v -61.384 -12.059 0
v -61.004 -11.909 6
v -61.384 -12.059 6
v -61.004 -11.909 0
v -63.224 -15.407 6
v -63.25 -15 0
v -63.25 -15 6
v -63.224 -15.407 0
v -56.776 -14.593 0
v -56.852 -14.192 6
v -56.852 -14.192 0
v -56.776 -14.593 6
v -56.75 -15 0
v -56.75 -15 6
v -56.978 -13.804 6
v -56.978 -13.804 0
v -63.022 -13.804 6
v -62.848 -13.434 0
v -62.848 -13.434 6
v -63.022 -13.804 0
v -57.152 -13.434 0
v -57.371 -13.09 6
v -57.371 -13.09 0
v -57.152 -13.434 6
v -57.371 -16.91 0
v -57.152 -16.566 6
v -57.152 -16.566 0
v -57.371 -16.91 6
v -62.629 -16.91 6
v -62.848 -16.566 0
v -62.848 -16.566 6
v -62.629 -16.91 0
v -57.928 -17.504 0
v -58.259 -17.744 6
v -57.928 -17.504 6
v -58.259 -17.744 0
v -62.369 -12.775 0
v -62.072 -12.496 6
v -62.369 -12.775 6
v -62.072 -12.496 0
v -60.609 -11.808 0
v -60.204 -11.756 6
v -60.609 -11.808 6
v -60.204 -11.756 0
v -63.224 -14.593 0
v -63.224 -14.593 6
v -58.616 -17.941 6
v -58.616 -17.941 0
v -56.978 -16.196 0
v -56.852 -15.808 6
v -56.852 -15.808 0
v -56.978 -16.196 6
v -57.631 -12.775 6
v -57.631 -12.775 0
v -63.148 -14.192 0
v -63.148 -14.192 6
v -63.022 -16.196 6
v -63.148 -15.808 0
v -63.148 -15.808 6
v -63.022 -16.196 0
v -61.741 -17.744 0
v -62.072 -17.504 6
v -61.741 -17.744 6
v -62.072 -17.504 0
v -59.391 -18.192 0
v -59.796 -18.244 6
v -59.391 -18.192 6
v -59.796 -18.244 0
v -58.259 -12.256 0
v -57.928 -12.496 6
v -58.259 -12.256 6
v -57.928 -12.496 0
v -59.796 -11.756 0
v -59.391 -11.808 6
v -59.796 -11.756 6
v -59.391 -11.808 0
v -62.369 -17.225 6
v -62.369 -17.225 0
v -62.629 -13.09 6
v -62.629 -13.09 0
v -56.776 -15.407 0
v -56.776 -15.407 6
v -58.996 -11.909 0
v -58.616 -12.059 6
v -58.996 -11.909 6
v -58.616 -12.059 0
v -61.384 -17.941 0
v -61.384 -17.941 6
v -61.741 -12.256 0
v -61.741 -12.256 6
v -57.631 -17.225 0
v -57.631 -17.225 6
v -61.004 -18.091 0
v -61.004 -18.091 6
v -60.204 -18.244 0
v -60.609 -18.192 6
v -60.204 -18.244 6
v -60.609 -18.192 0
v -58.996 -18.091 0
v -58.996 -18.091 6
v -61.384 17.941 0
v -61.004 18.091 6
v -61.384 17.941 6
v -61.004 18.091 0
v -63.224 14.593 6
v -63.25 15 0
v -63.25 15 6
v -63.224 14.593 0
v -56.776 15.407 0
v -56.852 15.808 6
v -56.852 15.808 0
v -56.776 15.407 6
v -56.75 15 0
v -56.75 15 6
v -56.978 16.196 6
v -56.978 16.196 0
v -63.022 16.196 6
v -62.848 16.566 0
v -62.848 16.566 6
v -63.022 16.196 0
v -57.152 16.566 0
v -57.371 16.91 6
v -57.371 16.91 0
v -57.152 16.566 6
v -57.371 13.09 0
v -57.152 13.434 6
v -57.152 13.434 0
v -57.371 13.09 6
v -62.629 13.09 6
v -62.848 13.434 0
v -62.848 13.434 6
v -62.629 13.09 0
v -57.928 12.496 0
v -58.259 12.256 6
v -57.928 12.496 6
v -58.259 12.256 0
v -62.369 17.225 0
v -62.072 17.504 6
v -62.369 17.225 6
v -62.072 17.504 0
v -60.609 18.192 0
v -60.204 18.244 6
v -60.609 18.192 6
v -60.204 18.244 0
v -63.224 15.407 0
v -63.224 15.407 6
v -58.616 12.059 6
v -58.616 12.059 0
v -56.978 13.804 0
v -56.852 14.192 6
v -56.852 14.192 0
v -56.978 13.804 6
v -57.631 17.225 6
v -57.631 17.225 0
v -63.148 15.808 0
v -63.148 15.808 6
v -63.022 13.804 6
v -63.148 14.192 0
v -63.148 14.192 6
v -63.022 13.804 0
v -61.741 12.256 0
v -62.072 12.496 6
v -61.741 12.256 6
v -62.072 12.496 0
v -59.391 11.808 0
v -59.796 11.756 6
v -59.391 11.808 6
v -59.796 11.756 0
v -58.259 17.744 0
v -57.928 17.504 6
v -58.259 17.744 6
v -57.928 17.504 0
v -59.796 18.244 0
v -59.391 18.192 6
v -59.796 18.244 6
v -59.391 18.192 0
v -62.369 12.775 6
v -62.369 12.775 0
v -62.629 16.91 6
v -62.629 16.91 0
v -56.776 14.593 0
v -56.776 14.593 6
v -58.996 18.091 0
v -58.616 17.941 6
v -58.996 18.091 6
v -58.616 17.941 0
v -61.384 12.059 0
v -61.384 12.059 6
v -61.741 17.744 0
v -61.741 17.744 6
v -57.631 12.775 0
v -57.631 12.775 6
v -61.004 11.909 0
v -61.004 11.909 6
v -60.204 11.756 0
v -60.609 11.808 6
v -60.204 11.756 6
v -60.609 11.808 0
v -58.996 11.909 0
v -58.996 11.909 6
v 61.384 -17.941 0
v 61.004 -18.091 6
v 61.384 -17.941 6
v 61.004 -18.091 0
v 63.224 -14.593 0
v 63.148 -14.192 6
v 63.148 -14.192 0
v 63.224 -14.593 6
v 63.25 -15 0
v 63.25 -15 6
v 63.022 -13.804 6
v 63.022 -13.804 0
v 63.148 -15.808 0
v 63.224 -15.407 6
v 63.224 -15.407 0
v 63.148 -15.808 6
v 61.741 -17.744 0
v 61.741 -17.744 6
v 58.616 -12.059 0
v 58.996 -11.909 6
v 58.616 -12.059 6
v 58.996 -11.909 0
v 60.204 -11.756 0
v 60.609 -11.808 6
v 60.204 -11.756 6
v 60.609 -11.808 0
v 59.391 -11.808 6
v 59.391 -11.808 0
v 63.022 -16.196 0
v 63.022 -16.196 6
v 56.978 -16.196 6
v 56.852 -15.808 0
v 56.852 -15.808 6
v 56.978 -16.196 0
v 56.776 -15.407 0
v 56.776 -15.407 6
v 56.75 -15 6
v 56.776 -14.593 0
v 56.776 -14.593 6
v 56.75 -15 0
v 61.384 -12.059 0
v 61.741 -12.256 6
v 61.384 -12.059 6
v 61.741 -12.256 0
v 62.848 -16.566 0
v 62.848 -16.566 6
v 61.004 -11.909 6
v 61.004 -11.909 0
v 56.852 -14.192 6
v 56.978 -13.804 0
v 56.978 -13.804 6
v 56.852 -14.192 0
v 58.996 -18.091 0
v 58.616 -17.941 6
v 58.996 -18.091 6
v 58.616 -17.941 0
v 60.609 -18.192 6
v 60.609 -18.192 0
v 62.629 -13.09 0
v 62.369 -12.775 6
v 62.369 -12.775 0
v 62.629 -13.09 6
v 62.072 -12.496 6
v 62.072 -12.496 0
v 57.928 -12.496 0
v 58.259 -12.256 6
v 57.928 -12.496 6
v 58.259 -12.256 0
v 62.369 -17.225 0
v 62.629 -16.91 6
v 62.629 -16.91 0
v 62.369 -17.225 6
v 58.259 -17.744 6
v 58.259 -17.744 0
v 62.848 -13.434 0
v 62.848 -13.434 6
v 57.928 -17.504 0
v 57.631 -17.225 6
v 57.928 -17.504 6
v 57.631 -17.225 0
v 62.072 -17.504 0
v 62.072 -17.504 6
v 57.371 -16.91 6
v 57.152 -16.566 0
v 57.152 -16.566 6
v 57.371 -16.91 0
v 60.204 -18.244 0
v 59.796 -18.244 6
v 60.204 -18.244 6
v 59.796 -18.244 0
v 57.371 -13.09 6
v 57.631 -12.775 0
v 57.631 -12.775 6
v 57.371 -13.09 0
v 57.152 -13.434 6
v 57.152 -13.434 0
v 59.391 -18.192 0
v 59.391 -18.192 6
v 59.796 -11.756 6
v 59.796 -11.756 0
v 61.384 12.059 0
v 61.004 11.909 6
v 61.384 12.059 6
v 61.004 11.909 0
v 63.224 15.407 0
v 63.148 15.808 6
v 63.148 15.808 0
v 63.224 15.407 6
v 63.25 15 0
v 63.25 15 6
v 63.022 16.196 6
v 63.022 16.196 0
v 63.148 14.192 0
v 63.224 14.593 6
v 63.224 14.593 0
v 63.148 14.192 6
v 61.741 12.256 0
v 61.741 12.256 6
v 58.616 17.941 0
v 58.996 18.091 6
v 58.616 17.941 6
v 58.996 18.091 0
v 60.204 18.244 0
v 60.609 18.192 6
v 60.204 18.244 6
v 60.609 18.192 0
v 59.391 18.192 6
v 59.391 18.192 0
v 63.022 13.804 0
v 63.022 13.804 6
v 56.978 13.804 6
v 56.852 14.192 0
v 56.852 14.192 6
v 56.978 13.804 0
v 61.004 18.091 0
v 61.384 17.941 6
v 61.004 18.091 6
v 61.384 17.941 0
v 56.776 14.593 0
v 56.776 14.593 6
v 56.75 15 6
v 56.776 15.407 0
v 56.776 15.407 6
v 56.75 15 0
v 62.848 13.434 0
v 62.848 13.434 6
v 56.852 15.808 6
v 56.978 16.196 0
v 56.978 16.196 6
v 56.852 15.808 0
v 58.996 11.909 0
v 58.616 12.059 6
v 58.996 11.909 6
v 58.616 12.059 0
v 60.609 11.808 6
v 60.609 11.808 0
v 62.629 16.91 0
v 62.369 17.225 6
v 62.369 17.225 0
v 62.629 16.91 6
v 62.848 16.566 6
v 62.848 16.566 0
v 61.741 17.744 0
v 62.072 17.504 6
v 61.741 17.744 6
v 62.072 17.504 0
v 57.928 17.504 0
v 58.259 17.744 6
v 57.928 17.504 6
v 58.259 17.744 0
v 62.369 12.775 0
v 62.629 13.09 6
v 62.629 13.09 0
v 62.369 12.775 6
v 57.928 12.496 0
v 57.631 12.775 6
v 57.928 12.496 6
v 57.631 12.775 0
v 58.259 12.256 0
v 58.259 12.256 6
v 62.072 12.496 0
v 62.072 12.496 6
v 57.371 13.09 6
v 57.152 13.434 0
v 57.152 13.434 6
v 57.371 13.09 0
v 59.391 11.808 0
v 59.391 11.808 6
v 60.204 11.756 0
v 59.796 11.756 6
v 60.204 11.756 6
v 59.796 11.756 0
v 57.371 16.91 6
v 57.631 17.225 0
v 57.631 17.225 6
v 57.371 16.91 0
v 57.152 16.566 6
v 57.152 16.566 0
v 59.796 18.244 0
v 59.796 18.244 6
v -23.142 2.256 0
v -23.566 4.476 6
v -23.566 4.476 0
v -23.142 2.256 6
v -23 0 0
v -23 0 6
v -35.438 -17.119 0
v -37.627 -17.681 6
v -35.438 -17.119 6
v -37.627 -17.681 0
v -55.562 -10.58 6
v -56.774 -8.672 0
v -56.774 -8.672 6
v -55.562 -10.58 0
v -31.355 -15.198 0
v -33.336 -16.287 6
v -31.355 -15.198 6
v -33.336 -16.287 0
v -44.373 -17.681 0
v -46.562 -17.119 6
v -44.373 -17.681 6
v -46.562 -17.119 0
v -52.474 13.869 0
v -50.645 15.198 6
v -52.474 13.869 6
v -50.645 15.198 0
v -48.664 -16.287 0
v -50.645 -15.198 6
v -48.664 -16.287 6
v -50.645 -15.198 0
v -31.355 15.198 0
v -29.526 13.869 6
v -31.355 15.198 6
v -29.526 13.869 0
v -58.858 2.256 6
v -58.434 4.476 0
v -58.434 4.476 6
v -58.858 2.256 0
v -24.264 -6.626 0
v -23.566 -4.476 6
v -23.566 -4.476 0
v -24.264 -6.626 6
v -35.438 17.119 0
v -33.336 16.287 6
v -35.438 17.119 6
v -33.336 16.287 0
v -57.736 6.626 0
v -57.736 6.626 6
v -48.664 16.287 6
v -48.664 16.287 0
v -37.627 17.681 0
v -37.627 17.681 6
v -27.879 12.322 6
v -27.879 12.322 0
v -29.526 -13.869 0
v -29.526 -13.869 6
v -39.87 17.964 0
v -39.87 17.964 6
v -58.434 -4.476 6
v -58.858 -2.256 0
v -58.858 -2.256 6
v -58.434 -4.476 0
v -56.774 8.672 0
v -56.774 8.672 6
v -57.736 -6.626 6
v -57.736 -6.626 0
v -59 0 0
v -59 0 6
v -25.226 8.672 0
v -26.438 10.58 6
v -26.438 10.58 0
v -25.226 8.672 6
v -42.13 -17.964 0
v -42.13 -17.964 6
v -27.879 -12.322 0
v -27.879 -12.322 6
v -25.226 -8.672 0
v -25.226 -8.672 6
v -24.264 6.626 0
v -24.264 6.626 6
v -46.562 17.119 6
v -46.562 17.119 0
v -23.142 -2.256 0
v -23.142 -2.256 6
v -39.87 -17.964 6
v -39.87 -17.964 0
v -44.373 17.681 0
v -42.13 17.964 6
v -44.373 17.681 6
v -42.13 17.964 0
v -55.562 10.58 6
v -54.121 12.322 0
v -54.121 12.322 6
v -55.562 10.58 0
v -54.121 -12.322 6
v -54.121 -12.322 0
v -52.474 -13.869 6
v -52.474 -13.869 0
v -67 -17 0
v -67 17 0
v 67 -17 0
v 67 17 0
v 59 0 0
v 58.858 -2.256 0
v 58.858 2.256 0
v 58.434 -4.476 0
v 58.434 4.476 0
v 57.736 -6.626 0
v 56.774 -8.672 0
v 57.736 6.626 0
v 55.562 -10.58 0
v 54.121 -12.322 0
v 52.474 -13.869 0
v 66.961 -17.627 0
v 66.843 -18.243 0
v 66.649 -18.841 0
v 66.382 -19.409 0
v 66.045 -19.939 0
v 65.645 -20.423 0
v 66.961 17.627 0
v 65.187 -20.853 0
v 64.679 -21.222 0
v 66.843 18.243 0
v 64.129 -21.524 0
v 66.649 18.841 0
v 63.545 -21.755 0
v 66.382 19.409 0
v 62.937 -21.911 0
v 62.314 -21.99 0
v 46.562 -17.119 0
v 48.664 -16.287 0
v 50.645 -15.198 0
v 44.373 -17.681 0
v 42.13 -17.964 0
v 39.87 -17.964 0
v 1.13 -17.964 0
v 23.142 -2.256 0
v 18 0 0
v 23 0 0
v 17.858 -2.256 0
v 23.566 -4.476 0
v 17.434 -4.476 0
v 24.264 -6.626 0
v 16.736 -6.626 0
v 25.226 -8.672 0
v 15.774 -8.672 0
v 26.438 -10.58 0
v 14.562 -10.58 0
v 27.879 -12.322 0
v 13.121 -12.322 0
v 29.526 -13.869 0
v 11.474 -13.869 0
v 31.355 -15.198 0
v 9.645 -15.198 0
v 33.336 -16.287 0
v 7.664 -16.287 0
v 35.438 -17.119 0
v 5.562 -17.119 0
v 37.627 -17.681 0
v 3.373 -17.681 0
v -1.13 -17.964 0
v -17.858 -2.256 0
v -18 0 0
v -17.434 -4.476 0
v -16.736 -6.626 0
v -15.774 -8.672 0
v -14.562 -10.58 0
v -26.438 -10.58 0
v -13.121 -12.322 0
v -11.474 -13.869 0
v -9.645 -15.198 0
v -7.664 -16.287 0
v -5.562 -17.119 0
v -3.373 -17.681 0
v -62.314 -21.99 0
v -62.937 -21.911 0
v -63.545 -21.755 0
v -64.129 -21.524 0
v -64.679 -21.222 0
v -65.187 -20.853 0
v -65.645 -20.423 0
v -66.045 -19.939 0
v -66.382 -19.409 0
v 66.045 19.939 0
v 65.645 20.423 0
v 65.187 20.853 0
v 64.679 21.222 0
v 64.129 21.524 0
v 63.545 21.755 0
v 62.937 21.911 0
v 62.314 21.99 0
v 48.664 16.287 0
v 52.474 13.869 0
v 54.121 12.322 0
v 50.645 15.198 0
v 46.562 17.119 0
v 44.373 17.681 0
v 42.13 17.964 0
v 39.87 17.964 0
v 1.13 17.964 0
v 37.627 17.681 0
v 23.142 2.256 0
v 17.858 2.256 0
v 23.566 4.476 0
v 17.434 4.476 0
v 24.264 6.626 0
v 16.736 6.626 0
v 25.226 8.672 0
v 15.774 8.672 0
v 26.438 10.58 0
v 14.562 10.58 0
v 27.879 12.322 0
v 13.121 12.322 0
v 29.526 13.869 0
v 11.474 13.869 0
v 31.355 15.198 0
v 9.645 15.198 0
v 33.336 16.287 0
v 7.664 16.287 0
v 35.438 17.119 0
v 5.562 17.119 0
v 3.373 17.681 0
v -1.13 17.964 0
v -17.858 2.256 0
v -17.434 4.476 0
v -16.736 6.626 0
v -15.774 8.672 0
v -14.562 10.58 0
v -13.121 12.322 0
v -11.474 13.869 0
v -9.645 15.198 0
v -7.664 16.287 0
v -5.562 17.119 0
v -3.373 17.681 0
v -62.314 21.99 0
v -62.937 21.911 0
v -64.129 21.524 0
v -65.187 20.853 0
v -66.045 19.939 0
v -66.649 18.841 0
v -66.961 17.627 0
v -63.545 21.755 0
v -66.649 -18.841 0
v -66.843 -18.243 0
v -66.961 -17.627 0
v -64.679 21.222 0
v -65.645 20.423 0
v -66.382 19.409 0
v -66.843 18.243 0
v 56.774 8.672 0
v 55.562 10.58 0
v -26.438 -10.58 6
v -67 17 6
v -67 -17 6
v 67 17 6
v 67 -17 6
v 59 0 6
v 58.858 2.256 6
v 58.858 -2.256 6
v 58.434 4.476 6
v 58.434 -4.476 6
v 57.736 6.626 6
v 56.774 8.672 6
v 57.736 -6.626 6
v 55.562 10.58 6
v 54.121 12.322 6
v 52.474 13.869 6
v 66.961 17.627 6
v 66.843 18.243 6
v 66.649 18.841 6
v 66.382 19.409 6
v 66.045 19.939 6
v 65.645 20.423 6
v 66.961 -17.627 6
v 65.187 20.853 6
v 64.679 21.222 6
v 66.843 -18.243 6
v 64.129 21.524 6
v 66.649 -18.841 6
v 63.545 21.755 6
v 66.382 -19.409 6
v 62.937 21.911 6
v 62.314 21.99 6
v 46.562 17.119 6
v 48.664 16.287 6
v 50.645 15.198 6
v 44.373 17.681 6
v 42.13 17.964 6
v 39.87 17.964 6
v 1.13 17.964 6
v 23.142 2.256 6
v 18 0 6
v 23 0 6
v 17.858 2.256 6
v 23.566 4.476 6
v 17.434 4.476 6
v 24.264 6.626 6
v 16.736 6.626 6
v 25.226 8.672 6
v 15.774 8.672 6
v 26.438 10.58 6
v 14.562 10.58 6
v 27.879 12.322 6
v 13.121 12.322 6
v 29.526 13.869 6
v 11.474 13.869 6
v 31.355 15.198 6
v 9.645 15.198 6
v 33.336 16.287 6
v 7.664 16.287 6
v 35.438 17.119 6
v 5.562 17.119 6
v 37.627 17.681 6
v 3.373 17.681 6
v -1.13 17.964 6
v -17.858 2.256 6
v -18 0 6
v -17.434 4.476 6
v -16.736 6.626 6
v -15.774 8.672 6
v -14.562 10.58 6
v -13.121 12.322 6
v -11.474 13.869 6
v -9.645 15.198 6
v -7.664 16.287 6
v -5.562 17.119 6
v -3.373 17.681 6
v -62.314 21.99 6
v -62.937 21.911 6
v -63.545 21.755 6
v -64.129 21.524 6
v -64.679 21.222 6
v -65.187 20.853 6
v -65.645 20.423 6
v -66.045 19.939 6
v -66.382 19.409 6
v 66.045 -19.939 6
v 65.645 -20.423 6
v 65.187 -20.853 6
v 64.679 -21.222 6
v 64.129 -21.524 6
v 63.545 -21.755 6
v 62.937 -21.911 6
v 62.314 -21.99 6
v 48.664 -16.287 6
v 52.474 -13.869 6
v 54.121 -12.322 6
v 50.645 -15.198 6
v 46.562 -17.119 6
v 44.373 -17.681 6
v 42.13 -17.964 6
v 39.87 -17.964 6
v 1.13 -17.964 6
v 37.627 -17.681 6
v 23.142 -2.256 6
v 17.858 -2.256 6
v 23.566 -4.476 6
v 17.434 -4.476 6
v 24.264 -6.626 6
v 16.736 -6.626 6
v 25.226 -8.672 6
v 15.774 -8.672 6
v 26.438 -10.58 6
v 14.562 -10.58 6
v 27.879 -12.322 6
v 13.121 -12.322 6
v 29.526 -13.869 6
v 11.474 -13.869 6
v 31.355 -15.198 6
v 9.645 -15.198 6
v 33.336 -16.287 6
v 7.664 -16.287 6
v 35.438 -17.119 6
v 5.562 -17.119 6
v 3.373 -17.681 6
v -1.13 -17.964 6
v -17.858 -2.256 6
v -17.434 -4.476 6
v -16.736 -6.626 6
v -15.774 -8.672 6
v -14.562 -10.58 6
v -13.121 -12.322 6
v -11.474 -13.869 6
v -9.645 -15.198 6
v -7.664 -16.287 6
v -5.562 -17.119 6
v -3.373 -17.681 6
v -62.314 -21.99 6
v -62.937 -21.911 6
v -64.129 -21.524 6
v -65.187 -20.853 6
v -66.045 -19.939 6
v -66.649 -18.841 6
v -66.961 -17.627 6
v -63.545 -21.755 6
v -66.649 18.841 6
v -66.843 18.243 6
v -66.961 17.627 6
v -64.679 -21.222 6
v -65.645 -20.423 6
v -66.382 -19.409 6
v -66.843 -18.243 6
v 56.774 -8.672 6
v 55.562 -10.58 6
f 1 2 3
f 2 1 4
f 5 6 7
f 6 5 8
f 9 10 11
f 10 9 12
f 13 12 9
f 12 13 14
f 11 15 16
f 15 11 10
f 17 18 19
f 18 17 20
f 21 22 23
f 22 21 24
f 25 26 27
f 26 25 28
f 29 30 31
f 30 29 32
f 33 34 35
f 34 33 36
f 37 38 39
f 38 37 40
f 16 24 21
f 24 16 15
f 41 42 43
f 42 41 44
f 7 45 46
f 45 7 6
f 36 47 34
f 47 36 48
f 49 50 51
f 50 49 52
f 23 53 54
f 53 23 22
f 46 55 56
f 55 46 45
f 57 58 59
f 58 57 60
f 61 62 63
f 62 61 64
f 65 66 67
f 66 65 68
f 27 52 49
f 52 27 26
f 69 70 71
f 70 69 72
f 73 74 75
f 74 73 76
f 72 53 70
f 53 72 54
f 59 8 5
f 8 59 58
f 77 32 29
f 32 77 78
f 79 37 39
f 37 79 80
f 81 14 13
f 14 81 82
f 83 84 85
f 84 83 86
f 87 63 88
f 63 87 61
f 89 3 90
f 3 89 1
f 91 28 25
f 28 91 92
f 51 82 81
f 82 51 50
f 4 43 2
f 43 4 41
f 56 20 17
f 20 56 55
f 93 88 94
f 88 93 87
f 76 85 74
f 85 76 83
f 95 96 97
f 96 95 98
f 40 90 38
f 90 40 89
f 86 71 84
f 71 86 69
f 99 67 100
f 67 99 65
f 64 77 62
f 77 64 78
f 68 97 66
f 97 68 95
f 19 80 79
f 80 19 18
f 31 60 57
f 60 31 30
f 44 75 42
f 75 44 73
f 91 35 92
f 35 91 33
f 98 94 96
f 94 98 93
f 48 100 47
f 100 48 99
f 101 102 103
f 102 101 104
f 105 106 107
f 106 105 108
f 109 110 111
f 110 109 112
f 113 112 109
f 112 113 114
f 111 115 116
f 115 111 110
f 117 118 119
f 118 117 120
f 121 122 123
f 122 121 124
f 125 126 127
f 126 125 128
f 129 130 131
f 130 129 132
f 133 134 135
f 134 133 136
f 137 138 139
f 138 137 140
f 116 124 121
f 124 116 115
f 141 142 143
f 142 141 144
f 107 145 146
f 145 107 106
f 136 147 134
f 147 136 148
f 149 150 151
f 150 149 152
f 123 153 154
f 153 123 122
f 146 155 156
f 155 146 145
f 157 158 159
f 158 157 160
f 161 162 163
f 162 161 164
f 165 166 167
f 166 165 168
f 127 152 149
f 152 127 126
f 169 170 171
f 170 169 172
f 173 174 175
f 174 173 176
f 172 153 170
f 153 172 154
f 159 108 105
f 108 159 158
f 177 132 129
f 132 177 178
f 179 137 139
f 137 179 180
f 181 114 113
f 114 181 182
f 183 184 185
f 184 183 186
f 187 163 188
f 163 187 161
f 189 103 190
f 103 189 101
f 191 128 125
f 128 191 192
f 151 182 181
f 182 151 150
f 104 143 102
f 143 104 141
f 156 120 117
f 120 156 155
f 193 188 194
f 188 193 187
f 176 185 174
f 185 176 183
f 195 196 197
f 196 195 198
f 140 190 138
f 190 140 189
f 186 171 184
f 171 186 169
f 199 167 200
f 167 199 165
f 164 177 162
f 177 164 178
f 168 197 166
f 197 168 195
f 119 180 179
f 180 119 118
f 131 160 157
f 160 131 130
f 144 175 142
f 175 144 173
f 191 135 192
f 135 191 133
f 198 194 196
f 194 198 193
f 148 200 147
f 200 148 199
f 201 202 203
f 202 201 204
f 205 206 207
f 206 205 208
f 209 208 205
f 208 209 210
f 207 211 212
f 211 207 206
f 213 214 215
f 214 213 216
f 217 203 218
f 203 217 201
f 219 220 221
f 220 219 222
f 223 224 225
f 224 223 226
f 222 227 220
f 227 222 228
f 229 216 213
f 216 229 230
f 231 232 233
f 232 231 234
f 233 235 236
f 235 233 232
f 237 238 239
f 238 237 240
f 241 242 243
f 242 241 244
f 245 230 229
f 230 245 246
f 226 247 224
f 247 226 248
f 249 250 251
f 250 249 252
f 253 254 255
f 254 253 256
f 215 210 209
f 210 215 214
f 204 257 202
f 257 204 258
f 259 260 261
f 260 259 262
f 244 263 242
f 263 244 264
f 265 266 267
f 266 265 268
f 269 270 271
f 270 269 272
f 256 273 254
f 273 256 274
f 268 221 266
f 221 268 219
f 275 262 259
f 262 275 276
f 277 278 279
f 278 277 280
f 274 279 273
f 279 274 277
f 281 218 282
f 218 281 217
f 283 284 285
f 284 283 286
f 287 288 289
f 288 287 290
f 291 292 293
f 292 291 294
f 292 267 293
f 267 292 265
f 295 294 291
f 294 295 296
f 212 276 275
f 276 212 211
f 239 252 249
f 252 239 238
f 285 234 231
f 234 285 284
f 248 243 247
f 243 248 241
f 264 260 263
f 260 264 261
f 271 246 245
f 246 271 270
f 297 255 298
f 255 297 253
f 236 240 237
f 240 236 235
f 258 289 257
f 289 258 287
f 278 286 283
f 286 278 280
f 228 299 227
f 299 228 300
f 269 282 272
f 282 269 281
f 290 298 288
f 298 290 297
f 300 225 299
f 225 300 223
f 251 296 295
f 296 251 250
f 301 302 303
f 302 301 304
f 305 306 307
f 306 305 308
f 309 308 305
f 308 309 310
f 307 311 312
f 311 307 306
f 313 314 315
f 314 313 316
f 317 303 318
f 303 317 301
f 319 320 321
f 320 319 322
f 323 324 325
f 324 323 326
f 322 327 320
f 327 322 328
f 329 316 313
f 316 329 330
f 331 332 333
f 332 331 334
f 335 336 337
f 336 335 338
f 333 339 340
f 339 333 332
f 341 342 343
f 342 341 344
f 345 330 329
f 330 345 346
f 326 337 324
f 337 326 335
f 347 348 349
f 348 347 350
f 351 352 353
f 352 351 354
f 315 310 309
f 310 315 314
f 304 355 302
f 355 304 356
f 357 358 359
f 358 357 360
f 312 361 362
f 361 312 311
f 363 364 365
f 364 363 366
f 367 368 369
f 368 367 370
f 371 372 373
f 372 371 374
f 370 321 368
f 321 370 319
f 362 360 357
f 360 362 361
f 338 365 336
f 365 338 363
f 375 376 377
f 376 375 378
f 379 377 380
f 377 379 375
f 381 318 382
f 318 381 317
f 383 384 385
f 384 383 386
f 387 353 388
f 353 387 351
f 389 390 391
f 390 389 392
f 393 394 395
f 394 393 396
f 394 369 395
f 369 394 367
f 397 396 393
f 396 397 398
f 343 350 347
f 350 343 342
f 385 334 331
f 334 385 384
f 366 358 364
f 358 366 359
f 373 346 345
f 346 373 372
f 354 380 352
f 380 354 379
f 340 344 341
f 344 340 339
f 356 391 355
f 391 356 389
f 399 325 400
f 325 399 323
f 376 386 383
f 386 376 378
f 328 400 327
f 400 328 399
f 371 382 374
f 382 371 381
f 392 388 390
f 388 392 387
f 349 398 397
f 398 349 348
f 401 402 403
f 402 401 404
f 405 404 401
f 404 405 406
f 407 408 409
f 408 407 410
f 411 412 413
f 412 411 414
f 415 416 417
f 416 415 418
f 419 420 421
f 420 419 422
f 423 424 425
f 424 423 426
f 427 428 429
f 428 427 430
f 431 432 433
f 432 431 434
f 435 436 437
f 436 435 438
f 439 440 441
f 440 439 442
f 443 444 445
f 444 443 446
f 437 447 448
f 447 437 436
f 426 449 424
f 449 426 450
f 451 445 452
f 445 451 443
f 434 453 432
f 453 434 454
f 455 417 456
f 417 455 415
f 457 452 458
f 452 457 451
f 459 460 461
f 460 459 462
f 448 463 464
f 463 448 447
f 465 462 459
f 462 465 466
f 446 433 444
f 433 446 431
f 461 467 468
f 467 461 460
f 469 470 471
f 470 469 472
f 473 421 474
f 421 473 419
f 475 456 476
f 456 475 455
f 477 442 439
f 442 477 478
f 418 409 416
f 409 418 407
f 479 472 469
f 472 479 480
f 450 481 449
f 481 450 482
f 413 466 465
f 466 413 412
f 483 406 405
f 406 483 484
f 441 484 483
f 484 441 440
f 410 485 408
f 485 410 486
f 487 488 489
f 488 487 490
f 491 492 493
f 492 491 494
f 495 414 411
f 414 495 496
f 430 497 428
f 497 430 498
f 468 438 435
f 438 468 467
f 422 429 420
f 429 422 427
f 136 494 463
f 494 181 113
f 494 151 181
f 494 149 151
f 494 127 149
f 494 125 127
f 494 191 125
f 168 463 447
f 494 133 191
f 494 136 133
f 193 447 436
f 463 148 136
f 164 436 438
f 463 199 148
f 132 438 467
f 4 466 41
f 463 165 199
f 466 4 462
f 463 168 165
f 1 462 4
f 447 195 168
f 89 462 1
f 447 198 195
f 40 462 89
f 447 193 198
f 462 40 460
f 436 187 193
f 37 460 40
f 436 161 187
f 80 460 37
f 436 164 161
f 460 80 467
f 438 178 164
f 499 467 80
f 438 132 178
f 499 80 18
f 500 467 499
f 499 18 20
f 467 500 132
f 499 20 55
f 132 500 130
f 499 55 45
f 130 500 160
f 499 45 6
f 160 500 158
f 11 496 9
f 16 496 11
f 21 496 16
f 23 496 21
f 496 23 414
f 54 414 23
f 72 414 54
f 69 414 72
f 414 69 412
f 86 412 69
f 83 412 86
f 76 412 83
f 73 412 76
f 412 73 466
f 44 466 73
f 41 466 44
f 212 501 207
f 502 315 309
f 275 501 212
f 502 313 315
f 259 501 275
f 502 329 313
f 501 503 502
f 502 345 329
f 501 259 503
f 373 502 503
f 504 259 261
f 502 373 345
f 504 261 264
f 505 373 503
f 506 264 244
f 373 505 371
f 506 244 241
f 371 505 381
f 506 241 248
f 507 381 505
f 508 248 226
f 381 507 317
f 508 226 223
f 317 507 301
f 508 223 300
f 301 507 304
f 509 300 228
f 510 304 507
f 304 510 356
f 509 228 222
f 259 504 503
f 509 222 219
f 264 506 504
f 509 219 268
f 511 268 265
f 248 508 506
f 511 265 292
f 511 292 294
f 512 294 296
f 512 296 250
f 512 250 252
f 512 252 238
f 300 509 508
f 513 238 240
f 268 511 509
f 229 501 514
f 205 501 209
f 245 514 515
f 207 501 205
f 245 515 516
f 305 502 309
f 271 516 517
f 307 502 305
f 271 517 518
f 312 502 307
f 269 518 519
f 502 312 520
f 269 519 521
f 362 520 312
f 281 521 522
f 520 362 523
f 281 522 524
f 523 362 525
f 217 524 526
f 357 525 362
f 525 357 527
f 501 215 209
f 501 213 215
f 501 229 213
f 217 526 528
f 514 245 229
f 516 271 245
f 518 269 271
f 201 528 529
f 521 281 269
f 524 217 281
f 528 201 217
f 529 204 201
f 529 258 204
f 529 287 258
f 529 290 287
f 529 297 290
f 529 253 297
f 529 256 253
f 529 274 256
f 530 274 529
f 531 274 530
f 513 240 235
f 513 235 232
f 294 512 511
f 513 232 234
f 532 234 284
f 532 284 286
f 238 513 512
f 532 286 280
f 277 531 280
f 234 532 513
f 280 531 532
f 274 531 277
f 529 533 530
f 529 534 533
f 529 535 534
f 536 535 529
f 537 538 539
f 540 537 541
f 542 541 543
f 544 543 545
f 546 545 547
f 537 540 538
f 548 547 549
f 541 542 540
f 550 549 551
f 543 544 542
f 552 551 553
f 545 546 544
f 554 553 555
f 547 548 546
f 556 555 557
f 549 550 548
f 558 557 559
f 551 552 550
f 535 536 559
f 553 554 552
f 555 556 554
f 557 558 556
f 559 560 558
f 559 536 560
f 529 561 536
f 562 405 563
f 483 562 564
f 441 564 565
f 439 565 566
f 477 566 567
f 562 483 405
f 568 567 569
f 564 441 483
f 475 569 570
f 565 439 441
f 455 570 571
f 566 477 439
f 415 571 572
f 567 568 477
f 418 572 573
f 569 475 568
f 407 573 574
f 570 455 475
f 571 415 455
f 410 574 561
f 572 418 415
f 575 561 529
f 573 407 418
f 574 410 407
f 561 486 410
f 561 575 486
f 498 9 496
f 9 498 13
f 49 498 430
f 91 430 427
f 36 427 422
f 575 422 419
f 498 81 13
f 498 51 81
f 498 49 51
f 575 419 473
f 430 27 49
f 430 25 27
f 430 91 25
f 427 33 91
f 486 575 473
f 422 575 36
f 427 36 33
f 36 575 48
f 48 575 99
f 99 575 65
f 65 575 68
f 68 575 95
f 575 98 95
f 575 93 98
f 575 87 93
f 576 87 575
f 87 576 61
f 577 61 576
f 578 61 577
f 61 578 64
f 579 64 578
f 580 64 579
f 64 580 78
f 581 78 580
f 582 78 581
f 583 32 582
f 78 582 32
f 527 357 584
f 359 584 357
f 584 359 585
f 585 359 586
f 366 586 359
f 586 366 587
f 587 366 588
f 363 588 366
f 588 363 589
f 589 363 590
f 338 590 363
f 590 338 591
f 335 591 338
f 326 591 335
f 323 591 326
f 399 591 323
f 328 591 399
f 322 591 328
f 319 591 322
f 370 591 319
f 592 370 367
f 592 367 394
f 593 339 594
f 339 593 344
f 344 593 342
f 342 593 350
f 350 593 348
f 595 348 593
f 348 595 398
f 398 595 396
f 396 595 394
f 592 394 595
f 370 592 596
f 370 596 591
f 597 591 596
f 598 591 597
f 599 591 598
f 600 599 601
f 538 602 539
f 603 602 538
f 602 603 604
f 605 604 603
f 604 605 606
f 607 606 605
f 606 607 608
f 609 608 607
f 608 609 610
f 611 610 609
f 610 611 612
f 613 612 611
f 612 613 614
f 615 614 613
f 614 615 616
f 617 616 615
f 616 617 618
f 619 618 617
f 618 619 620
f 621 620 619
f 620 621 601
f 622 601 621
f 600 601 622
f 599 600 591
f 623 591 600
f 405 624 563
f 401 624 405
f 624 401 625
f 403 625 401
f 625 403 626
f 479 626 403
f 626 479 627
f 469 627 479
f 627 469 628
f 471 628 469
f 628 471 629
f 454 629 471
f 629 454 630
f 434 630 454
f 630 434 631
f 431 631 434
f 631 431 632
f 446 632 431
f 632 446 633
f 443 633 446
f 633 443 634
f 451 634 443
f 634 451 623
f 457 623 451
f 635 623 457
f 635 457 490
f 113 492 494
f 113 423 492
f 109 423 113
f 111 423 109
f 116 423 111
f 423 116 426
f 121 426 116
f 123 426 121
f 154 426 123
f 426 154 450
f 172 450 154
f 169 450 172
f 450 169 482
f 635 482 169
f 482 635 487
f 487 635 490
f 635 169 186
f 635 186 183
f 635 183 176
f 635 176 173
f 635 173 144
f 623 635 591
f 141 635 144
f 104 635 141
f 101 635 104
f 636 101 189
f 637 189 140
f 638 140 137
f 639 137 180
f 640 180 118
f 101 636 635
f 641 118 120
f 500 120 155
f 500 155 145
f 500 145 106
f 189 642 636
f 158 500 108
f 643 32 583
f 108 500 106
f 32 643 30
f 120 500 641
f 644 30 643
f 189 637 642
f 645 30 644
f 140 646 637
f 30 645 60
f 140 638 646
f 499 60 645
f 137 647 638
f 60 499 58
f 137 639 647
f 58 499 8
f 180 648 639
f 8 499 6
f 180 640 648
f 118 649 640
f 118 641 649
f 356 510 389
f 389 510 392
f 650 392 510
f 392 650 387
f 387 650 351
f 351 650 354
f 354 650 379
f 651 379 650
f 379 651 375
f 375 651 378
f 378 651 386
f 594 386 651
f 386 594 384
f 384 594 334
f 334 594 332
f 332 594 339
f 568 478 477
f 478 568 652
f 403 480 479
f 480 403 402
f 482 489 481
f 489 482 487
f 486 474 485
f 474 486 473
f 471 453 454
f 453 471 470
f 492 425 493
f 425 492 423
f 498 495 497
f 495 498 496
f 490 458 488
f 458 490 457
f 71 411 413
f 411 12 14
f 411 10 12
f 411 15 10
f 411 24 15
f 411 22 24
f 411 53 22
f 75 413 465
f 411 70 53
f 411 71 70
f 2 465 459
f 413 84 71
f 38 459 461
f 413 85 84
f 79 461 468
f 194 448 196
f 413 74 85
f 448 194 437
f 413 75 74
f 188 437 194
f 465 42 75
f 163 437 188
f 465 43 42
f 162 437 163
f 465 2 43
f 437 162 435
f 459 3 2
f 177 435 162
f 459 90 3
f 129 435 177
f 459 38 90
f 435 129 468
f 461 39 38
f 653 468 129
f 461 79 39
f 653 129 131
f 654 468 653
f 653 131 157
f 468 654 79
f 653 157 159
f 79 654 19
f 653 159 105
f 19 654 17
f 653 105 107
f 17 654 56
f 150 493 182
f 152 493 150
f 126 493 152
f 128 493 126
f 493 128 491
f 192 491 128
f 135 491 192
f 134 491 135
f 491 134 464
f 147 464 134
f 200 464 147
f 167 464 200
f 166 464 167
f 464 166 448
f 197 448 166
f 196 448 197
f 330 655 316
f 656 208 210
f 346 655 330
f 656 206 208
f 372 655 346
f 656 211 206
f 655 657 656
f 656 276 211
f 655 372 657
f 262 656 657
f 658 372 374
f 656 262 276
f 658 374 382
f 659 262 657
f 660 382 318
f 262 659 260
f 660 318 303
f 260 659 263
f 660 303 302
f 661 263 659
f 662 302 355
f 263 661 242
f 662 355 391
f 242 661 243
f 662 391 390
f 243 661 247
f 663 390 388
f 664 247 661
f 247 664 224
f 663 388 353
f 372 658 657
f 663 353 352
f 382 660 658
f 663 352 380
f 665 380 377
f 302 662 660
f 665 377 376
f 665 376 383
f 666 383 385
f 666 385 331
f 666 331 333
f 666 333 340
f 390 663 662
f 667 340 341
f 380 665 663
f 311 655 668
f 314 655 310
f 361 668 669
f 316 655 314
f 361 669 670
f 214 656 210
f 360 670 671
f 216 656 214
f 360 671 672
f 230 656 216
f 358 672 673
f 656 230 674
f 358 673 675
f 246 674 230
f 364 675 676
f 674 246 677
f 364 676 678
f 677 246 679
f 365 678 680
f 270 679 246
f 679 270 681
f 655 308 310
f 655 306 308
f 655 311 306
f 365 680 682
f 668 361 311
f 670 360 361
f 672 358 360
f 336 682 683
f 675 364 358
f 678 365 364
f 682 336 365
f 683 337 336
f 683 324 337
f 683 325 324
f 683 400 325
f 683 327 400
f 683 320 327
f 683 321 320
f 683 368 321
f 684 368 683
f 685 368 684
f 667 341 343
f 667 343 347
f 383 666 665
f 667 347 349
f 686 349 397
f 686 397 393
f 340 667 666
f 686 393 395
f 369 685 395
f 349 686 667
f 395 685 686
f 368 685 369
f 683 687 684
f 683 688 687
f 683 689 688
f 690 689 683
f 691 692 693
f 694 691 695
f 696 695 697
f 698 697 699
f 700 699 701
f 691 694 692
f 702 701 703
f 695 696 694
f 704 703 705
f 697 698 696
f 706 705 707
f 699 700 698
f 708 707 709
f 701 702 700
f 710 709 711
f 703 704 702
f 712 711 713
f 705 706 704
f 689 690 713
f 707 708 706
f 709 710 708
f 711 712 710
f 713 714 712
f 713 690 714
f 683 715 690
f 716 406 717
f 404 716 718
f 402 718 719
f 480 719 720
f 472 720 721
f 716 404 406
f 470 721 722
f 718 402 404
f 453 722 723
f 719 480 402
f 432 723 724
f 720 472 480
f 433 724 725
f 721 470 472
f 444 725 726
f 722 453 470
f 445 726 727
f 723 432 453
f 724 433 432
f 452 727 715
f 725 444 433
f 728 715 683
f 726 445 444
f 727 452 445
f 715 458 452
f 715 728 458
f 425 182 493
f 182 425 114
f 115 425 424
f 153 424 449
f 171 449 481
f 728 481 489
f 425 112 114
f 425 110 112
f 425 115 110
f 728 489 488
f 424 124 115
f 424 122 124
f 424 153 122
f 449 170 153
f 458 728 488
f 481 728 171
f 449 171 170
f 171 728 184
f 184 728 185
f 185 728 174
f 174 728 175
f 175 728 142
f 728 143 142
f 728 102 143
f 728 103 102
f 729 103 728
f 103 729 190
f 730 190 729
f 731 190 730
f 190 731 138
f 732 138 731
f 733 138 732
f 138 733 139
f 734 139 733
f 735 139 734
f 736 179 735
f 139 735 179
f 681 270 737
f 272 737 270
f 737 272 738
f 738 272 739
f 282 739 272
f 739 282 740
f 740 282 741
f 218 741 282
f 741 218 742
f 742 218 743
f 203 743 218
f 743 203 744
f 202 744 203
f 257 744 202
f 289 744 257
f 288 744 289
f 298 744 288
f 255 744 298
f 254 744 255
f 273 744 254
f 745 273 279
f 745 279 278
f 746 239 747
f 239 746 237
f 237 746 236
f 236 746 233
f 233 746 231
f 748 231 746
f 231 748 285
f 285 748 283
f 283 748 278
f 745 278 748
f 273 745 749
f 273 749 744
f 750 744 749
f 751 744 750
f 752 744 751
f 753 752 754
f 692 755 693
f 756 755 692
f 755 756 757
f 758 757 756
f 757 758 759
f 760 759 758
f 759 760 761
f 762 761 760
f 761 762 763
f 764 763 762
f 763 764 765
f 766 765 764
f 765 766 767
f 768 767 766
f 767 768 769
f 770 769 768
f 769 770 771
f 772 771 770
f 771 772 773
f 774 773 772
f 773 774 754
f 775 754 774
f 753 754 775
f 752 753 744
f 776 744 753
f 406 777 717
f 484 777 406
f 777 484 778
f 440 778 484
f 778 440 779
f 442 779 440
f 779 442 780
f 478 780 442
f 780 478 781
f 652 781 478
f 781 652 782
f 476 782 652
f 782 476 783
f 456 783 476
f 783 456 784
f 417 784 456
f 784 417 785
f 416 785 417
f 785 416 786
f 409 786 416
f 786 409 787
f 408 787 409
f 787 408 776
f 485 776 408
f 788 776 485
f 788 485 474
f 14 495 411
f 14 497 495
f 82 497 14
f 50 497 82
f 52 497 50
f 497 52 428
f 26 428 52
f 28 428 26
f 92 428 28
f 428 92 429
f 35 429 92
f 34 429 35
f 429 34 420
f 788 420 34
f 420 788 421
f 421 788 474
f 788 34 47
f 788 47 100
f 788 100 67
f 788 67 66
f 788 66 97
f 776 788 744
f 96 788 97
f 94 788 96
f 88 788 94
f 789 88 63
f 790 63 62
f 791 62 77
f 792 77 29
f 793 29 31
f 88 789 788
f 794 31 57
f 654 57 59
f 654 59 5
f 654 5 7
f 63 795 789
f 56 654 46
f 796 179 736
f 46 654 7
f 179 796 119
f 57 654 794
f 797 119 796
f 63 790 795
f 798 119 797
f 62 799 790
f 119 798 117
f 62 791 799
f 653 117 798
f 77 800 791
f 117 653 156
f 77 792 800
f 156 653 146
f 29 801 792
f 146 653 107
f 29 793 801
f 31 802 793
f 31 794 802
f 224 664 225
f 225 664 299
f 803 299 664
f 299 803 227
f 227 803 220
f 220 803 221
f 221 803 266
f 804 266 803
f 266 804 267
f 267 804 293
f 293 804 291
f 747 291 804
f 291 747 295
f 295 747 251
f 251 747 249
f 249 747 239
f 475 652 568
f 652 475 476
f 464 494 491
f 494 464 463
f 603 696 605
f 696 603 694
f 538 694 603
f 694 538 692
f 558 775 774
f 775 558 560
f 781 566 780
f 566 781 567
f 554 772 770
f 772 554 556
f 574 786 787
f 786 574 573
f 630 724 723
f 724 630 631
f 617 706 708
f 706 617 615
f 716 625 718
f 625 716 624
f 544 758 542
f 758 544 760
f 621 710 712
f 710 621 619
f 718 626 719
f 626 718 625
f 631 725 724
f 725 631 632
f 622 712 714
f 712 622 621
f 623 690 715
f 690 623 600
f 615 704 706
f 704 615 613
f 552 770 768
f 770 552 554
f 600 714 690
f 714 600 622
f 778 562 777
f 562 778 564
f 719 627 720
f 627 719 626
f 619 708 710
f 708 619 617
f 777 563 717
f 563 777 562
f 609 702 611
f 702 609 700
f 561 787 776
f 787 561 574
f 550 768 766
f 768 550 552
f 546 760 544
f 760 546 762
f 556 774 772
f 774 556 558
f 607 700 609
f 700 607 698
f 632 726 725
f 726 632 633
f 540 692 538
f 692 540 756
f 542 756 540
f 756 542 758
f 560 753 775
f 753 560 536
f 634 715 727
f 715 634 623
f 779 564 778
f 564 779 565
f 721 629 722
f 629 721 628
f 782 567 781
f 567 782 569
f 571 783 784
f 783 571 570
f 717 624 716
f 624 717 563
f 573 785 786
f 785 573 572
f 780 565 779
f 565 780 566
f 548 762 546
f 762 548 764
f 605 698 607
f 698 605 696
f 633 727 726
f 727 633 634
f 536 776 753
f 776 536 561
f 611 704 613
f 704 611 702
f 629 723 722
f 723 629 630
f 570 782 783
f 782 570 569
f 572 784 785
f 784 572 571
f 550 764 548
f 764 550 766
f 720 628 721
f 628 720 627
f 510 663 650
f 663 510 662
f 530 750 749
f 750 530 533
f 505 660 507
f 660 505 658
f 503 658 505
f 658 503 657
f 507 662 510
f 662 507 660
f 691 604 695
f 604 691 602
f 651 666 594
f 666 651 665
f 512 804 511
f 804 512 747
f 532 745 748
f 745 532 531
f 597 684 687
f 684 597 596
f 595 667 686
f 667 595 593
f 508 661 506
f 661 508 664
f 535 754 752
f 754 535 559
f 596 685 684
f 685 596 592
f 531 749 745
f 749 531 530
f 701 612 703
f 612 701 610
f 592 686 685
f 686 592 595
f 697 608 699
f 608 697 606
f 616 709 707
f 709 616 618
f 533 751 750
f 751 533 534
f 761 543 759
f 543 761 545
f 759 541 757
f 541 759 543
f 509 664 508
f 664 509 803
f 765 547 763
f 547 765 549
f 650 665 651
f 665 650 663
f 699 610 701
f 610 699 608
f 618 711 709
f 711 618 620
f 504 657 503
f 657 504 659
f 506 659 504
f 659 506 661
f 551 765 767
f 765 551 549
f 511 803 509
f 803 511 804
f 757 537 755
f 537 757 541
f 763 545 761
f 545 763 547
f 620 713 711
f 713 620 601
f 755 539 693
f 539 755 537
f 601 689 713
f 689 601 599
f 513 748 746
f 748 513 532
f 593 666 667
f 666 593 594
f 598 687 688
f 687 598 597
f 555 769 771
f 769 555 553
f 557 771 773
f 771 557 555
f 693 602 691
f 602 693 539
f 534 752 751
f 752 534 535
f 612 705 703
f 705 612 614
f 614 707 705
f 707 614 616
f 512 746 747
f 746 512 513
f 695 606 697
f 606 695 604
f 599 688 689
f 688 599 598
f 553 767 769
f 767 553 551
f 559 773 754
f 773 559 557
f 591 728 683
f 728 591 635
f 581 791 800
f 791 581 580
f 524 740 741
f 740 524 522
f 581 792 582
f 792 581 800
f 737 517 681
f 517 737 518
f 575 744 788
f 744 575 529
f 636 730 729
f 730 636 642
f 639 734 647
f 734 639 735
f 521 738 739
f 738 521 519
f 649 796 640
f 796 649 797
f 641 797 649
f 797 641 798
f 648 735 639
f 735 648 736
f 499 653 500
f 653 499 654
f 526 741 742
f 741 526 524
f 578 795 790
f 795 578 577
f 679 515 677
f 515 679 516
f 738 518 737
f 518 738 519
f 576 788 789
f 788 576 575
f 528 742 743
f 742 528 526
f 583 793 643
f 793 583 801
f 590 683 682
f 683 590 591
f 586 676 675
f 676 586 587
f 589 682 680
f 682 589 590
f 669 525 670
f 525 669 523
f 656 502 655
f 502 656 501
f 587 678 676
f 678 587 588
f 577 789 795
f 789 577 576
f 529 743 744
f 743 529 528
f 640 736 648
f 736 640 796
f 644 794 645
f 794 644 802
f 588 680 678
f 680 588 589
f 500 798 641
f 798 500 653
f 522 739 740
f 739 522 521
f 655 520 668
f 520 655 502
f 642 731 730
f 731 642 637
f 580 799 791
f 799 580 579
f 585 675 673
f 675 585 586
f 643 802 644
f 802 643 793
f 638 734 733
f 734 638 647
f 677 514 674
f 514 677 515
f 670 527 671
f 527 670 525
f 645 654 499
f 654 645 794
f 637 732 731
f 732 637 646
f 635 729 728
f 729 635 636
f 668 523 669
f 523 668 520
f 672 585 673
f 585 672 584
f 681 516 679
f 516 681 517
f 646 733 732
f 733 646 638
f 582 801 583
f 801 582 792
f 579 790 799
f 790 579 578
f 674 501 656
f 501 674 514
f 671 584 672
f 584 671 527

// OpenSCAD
$fn = 50;


difference() {
	union() {
		hull() {
			translate(v = [-62.0000000000, 17.0000000000, 0]) {
				cylinder(h = 6, r = 5);
			}
			translate(v = [62.0000000000, 17.0000000000, 0]) {
				cylinder(h = 6, r = 5);
			}
			translate(v = [-62.0000000000, -17.0000000000, 0]) {
				cylinder(h = 6, r = 5);
			}
			translate(v = [62.0000000000, -17.0000000000, 0]) {
				cylinder(h = 6, r = 5);
			}
		}
	}
	union() {
		#translate(v = [-60.0000000000, -15.0000000000, -100.0000000000]) {
			cylinder(h = 200, r = 3.2500000000);
		}
		#translate(v = [-60.0000000000, 15.0000000000, -100.0000000000]) {
			cylinder(h = 200, r = 3.2500000000);
		}
		#translate(v = [60.0000000000, -15.0000000000, -100.0000000000]) {
			cylinder(h = 200, r = 3.2500000000);
		}
		#translate(v = [60.0000000000, 15.0000000000, -100.0000000000]) {
			cylinder(h = 200, r = 3.2500000000);
		}
		#translate(v = [-41.0000000000, 0, 0]) {
			cylinder(h = 6, r = 18.0000000000);
		}
		#cylinder(h = 6, r = 18.0000000000);
		#translate(v = [41.0000000000, 0, 0]) {
			cylinder(h = 6, r = 18.0000000000);
		}
	}
}
